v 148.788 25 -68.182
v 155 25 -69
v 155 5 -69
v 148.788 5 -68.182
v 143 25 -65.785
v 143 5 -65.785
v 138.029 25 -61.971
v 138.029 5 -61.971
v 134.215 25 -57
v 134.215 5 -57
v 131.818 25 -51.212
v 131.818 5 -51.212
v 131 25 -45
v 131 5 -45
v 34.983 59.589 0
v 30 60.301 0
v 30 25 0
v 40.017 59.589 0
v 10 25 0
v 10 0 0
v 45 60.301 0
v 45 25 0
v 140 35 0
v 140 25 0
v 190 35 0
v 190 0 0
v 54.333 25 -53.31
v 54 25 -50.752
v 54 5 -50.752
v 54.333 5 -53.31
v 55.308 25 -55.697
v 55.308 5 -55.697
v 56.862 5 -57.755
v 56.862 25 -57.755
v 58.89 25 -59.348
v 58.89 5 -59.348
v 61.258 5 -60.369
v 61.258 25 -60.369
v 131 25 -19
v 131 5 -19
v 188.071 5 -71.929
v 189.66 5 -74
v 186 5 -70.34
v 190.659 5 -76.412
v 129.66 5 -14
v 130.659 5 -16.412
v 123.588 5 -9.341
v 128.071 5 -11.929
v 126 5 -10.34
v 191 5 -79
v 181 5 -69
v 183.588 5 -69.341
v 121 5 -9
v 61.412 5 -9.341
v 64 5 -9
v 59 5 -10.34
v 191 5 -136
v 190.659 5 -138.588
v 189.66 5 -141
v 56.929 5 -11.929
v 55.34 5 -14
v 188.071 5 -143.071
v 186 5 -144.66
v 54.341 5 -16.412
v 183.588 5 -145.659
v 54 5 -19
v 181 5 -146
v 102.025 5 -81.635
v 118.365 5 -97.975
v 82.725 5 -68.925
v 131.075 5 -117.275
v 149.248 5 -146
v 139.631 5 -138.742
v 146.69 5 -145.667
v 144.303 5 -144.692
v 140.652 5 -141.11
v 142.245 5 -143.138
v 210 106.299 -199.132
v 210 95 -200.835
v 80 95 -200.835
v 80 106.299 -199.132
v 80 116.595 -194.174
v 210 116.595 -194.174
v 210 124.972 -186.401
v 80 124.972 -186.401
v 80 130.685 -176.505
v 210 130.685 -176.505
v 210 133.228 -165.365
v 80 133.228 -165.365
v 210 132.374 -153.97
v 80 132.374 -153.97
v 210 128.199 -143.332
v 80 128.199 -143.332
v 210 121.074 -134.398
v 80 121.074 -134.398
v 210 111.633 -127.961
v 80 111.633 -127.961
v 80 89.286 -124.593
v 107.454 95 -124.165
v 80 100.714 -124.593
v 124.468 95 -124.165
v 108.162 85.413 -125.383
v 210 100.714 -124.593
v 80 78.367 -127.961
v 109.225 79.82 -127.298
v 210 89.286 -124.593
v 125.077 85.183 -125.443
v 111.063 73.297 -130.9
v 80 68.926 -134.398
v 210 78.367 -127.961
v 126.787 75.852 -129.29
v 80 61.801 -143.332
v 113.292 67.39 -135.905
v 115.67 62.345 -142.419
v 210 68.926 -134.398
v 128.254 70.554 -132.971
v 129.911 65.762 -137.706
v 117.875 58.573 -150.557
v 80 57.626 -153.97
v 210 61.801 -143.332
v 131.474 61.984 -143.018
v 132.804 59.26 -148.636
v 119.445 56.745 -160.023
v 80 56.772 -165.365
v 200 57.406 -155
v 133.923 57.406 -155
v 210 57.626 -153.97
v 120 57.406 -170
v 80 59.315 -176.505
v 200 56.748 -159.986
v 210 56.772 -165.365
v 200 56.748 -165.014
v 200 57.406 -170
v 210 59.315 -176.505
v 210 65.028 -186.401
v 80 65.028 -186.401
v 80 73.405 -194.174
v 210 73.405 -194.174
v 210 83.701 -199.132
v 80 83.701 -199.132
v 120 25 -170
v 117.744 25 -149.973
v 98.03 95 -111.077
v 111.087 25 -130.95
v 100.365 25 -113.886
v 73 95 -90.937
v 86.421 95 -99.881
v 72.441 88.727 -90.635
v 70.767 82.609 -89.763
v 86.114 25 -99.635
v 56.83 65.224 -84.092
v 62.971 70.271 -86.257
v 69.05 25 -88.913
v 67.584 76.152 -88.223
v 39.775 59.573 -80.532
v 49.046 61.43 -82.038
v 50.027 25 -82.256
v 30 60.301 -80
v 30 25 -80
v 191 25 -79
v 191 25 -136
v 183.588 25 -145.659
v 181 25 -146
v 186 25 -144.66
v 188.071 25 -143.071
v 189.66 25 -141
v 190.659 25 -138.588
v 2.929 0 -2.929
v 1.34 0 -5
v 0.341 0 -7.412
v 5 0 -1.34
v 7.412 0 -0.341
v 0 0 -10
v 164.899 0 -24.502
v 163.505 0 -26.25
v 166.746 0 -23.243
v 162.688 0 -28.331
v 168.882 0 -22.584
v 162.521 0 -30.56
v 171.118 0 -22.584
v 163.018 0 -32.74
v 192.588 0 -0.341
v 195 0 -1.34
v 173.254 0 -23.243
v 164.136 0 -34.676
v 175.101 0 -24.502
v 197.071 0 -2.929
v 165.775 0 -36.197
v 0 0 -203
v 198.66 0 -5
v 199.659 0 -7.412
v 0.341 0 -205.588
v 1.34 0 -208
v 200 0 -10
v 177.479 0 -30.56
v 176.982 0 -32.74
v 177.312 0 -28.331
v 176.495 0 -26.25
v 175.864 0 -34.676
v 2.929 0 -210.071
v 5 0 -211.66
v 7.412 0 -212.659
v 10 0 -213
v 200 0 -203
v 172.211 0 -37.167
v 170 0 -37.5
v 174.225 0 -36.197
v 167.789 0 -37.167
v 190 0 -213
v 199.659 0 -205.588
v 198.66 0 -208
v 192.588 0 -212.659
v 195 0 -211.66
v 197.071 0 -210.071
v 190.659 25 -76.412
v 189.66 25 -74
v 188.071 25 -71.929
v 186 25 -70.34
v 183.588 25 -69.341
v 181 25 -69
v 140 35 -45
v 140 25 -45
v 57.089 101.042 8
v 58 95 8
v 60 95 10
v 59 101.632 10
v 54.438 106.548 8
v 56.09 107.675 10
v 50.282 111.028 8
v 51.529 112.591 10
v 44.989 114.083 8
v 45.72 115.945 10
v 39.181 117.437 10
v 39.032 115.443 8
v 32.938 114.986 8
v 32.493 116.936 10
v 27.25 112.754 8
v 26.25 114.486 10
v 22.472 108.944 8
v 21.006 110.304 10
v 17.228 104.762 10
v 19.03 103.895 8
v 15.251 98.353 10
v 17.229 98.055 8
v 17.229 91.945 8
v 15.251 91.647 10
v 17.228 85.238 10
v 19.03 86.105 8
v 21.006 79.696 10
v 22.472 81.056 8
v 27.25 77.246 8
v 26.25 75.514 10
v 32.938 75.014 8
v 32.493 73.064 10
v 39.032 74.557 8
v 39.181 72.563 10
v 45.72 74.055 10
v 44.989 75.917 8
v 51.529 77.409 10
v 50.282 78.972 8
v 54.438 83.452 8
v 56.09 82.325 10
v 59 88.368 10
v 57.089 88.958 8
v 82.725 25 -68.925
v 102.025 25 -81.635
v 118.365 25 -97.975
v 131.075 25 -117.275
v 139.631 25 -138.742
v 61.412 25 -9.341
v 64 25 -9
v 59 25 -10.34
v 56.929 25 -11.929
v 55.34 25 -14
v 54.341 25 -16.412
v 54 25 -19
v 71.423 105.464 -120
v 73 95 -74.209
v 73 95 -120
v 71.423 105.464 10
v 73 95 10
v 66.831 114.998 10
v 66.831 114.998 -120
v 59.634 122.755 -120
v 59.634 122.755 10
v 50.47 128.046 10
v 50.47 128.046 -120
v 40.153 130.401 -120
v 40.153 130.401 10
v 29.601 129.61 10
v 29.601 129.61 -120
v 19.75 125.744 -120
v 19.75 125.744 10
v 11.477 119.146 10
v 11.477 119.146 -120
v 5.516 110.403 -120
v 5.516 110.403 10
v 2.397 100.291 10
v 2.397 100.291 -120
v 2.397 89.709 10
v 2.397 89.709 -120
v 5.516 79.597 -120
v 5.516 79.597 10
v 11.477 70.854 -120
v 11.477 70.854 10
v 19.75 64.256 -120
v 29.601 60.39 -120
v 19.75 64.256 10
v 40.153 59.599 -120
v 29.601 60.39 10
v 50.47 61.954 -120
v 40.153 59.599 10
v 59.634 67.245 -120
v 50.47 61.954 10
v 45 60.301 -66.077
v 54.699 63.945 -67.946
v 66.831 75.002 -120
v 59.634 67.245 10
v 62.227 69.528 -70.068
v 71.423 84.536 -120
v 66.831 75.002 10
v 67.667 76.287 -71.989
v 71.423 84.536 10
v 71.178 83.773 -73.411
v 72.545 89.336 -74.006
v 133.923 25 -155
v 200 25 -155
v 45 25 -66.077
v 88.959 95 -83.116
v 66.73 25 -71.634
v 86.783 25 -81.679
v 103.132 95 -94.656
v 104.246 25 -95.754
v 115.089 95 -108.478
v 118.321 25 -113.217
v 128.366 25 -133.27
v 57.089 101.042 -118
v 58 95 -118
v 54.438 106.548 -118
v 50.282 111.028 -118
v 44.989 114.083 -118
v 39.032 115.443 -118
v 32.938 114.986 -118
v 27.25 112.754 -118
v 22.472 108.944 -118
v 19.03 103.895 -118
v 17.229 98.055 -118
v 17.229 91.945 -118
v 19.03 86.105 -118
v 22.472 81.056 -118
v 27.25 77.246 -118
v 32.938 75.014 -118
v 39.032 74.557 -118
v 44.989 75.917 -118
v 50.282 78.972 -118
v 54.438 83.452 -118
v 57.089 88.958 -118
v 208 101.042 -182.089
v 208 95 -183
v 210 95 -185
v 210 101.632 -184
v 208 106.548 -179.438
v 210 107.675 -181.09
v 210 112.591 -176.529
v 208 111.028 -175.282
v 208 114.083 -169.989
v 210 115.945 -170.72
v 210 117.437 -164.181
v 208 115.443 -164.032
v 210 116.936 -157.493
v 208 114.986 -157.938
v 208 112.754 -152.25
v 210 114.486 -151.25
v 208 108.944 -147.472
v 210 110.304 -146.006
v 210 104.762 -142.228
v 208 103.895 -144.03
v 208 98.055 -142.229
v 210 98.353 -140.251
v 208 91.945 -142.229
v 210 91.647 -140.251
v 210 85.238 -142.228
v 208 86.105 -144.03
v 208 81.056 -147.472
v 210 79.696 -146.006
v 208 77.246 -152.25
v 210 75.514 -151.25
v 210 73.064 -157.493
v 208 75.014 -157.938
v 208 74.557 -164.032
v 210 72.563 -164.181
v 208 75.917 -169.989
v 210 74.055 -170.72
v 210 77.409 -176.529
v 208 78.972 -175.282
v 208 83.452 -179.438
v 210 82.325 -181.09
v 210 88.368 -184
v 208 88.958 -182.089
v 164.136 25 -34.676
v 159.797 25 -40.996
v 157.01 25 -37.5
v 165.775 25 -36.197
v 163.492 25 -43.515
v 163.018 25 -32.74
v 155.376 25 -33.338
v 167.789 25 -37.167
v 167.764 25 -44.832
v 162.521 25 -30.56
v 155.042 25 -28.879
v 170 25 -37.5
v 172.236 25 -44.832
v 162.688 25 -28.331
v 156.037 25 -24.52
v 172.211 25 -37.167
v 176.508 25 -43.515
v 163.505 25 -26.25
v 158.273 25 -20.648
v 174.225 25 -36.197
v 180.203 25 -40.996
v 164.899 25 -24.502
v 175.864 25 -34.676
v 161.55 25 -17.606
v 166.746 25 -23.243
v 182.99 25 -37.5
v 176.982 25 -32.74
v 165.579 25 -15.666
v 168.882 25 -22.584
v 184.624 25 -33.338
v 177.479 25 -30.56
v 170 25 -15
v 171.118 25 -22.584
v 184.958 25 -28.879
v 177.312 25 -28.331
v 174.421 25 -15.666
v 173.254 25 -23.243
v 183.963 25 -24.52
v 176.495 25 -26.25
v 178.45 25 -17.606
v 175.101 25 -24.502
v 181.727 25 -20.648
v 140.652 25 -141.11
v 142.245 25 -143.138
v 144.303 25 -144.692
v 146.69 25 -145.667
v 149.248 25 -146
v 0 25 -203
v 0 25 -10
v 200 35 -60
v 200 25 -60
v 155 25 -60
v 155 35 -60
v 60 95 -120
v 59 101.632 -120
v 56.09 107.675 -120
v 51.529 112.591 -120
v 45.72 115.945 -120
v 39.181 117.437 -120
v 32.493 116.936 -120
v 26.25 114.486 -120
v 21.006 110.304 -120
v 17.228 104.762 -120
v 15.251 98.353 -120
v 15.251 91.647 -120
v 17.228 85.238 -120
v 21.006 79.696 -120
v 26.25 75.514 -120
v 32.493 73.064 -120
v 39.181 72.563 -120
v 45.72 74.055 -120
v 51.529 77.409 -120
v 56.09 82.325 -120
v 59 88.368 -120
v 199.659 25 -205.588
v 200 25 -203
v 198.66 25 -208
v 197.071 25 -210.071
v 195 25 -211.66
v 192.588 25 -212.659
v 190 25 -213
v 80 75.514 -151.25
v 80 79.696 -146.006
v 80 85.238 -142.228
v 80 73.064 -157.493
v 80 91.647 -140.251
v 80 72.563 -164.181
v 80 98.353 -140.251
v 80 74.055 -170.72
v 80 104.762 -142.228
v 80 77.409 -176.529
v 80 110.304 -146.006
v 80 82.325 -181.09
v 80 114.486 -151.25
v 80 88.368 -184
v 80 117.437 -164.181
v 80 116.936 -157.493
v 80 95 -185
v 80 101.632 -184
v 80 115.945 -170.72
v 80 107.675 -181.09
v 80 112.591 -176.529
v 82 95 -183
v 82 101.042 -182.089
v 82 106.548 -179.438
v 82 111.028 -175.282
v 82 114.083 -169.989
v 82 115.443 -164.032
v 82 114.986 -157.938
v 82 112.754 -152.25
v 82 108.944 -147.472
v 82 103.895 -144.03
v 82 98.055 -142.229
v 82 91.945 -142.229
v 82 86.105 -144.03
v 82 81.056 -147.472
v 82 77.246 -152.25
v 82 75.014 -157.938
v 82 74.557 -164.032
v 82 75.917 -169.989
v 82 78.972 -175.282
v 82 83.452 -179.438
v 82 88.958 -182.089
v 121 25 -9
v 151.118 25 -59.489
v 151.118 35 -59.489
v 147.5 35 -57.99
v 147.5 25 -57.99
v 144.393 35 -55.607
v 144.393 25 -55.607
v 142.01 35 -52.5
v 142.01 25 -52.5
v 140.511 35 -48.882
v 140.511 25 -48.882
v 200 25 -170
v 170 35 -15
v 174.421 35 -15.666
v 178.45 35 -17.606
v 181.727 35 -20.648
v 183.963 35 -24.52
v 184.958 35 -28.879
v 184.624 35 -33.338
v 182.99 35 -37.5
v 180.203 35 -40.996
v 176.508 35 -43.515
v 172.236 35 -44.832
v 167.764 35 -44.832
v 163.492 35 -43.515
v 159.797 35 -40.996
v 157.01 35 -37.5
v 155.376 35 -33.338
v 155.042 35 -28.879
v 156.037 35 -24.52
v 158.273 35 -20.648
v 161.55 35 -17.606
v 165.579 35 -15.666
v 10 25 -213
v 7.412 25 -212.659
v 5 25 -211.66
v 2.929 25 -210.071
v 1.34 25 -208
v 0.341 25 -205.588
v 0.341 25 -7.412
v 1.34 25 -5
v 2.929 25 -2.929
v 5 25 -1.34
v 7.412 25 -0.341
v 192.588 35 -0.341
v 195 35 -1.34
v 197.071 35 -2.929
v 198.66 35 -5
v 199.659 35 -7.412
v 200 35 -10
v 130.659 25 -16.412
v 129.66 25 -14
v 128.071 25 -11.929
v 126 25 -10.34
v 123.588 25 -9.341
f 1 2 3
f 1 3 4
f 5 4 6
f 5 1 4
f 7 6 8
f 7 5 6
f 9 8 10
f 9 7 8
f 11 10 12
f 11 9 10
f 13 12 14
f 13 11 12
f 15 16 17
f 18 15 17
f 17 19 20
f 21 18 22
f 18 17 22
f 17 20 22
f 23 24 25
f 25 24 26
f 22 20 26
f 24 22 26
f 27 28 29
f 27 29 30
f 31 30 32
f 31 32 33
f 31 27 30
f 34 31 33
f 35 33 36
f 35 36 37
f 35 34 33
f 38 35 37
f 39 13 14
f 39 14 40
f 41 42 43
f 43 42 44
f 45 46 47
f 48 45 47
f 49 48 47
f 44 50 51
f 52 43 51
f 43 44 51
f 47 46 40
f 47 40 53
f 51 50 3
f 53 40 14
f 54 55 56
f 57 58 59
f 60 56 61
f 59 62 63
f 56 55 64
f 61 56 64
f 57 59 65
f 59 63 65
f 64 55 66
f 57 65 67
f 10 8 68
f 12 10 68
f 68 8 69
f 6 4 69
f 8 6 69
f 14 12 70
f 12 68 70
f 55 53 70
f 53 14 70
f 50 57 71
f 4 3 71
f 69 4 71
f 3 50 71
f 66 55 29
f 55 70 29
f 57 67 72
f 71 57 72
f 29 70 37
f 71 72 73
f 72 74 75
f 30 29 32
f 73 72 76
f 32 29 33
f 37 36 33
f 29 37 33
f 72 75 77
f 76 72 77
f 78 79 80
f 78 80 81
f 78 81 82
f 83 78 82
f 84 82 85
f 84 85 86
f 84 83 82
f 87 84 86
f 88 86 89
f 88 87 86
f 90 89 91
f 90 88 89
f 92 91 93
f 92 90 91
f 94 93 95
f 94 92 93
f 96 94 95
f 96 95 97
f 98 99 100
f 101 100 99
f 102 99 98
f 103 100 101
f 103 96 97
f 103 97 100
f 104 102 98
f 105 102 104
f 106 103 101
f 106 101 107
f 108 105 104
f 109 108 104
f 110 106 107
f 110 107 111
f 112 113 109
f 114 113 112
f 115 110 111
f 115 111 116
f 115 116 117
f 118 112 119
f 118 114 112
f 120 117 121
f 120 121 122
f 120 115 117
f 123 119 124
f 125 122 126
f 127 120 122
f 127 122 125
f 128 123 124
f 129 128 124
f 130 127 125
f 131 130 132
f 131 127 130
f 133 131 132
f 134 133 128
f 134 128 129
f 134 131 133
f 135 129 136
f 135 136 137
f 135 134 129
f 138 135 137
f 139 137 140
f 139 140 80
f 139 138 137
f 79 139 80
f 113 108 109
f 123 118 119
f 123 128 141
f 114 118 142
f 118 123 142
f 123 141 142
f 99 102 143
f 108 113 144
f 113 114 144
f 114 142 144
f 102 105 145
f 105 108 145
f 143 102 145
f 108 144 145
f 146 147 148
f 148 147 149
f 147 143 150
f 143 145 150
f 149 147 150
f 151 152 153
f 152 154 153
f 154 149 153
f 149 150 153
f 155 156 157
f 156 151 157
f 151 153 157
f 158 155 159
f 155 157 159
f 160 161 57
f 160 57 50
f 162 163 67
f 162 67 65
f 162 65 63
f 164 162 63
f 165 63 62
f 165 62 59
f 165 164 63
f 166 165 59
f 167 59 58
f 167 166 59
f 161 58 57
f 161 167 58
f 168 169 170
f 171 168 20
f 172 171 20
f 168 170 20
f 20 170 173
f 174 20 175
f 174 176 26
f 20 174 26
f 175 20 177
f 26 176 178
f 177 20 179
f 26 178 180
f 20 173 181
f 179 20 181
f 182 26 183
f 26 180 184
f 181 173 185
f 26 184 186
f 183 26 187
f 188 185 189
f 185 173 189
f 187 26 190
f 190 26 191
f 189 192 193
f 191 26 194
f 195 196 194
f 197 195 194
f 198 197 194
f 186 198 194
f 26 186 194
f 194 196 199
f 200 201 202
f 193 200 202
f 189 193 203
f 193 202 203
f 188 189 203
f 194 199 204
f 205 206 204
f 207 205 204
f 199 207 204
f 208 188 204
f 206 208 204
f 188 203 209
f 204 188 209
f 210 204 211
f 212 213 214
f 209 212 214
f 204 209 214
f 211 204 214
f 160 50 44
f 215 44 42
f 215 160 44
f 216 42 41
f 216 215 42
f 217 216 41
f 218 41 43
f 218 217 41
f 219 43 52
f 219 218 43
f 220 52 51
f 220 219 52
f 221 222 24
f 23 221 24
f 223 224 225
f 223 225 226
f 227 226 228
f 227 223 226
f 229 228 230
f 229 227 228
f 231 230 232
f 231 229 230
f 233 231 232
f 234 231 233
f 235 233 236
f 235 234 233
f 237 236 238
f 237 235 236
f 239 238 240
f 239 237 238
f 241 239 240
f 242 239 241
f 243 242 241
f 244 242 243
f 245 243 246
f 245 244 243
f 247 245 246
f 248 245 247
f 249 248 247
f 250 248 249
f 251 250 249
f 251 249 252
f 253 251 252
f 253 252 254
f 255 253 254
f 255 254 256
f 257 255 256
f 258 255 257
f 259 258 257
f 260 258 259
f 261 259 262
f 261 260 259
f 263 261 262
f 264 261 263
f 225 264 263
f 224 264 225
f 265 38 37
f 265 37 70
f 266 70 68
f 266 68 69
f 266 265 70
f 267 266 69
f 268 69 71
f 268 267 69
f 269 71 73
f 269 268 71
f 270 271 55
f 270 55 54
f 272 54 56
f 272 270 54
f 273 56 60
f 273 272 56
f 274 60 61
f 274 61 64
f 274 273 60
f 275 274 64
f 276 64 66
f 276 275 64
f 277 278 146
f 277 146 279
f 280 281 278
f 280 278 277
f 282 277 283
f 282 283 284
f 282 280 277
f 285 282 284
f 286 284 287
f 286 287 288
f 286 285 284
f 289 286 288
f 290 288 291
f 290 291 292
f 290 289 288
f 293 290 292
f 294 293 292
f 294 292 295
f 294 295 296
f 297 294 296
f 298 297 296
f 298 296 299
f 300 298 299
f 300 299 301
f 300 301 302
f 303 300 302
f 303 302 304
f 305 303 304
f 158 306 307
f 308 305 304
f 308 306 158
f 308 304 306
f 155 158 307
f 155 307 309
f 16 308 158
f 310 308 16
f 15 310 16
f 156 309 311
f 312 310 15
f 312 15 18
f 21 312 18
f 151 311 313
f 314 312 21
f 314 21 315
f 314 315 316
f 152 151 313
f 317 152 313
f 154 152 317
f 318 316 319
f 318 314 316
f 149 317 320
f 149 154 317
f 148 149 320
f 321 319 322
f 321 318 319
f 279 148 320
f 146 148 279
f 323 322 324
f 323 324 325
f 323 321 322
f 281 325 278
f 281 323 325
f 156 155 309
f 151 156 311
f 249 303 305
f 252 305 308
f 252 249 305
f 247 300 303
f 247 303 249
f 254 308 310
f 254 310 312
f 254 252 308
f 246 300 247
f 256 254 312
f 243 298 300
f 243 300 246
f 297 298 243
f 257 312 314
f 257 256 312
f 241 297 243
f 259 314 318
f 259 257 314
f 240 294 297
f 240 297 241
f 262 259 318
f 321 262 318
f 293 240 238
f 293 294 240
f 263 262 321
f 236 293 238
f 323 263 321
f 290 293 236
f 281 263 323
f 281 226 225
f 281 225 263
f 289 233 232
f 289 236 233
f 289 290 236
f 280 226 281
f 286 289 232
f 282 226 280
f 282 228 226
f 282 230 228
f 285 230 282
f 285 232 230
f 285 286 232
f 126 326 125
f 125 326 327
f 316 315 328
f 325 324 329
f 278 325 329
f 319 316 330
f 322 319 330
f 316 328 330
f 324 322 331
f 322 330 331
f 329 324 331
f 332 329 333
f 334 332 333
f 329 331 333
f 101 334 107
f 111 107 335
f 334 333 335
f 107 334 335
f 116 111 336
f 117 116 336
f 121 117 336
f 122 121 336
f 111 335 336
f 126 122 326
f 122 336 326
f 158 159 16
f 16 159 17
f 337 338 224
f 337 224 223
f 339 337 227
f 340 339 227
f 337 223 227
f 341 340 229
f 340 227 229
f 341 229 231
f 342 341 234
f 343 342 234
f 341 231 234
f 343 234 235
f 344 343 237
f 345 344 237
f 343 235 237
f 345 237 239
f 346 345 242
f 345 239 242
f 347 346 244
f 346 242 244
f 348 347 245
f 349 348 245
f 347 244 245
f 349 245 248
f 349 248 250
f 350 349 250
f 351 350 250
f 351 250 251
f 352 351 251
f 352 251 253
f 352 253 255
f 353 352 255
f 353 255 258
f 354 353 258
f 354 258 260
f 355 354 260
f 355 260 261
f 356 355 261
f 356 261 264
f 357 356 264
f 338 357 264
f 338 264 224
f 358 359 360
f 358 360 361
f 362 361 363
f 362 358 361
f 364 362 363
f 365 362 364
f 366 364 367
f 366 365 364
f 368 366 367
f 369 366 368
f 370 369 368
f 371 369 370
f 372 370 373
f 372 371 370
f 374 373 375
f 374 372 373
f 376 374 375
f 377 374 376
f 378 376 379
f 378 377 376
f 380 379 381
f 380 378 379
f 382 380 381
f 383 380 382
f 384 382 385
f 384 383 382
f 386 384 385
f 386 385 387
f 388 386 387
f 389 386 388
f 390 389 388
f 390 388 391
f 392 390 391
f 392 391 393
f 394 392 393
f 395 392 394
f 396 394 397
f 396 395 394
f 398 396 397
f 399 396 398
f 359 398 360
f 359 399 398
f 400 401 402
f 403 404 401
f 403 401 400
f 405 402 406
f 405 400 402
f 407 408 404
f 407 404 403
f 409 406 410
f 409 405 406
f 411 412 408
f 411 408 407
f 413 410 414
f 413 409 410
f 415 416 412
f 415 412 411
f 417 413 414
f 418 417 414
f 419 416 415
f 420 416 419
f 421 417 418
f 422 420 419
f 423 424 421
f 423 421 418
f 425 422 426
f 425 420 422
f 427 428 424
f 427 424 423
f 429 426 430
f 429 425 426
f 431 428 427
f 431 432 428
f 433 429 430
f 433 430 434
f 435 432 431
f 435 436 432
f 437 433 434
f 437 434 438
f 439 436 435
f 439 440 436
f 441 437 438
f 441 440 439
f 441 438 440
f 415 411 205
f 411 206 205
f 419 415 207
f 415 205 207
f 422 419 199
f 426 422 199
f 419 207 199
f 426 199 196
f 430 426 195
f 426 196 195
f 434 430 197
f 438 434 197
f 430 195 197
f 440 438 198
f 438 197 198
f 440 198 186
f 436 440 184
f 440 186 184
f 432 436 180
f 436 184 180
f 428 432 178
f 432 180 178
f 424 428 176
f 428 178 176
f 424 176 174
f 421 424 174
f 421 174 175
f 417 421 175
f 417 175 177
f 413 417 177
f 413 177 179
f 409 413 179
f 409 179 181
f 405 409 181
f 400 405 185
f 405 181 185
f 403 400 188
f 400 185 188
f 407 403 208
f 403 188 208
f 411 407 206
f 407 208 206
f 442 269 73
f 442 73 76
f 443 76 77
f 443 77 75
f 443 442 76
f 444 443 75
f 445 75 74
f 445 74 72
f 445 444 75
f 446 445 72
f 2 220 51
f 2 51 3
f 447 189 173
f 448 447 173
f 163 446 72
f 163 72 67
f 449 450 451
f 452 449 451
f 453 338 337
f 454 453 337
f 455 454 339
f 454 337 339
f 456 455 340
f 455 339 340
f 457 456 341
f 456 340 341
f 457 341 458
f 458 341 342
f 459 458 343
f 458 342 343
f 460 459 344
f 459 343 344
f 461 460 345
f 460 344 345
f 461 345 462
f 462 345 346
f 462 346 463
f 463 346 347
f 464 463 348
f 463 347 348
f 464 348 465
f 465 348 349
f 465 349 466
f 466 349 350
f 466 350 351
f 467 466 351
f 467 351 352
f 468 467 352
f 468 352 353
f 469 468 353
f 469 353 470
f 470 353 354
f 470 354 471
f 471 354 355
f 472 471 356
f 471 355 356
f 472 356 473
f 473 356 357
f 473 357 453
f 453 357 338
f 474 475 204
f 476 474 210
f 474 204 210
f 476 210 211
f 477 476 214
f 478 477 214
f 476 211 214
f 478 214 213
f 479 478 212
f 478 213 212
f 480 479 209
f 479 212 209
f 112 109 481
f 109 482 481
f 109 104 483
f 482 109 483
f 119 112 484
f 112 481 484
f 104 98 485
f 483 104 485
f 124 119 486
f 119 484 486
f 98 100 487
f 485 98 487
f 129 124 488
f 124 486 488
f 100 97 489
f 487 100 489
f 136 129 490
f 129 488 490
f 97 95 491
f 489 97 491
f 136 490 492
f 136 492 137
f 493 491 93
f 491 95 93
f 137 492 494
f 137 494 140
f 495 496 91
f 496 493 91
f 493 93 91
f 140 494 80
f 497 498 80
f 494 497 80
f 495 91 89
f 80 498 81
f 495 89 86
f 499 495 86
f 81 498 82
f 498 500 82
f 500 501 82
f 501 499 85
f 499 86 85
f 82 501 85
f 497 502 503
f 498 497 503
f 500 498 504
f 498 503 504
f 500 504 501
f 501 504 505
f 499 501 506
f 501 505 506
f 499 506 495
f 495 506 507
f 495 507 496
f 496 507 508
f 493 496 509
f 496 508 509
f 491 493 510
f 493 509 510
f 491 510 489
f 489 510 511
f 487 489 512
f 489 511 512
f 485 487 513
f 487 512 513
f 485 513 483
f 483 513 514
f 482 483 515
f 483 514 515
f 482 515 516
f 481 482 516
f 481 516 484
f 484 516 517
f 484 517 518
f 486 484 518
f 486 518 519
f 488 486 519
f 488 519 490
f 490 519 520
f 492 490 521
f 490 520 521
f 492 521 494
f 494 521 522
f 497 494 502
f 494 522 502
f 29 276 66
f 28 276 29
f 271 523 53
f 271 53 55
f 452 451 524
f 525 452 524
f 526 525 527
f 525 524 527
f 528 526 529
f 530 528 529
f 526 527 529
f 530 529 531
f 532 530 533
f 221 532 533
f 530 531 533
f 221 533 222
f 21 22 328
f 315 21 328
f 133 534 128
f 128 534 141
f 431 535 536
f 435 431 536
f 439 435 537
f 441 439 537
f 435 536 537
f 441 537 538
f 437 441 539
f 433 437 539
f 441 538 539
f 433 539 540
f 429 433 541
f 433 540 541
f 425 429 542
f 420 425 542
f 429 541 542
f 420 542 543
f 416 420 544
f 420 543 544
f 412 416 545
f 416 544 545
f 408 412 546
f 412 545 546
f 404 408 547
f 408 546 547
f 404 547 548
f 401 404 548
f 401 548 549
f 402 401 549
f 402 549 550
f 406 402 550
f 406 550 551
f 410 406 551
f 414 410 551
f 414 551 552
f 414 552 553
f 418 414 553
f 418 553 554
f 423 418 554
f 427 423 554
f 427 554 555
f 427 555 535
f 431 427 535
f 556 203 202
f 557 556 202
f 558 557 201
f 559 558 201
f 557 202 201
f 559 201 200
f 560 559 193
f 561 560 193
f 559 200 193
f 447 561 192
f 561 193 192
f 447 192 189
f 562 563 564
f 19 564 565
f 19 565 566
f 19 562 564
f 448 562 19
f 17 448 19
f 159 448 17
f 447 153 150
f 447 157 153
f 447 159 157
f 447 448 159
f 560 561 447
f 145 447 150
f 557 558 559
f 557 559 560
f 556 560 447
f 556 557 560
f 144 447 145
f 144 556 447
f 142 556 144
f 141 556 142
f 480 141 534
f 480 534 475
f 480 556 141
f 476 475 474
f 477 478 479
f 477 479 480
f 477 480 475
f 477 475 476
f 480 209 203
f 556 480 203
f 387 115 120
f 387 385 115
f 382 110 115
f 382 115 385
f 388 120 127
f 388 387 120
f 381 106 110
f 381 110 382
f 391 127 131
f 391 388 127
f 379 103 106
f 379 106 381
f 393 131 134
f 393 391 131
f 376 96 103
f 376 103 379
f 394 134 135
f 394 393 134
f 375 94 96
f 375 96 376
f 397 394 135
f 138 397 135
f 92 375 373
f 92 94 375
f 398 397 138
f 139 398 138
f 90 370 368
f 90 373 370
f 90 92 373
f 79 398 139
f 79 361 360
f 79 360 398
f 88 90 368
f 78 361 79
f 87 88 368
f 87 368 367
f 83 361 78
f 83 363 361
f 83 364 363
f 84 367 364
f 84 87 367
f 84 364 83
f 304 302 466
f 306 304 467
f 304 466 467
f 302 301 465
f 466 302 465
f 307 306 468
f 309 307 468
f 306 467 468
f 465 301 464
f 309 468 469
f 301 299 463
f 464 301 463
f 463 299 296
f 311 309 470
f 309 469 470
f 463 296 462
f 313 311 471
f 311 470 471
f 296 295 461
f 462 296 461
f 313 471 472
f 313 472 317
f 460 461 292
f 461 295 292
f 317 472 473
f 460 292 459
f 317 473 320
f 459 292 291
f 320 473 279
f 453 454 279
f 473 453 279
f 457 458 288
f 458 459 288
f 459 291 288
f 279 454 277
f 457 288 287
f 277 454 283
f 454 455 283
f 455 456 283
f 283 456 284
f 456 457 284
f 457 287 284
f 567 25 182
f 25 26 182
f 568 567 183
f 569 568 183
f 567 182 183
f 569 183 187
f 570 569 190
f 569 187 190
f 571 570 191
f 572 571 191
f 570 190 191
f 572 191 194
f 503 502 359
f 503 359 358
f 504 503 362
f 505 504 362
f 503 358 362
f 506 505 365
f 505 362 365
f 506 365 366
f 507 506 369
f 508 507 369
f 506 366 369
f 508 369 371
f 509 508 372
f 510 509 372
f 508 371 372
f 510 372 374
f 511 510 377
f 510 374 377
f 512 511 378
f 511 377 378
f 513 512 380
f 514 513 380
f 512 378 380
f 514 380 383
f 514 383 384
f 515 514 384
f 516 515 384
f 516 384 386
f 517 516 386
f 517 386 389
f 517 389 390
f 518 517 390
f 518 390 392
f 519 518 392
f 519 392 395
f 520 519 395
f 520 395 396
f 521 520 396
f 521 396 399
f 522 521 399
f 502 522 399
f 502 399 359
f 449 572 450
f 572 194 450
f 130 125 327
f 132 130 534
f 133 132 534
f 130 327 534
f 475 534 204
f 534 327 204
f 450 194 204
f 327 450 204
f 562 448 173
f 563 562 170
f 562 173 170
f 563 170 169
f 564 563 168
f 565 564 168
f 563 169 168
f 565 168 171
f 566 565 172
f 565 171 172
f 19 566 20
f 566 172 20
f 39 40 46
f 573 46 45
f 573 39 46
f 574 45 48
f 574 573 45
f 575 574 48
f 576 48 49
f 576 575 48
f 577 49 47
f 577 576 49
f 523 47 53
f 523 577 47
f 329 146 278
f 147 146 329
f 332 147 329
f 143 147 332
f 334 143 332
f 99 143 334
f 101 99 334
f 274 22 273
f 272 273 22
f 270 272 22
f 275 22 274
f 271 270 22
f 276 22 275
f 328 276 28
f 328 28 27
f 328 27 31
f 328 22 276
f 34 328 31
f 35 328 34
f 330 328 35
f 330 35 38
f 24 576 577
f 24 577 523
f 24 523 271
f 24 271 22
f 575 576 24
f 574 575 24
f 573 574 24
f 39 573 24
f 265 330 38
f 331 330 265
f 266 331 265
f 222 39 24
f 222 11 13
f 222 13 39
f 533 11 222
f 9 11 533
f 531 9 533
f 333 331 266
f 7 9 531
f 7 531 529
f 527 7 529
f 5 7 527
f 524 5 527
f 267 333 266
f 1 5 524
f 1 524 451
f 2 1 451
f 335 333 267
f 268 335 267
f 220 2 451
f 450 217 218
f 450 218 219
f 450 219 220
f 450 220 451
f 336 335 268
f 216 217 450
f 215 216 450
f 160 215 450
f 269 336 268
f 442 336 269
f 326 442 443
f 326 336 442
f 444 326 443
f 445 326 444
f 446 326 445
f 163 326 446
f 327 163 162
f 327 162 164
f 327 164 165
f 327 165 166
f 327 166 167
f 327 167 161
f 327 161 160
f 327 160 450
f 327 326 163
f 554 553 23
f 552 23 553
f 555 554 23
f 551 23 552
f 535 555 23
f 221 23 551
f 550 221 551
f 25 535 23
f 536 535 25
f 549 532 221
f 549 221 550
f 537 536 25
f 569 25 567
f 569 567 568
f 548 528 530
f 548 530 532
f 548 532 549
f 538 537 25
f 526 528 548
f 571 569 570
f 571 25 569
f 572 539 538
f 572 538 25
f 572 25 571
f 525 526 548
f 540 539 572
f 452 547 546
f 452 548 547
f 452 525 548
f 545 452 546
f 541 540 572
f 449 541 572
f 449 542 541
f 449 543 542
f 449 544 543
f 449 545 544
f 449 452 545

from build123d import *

# Parameters (mm, degrees)
EXTRUDE_1_DEPTH              = 25
EXTRUDE_2_DEPTH              = 10
HOLE_WIZARD_M8_1_D           = 15
HOLE_WIZARD_M8_1_CBORE_D     = 30
HOLE_WIZARD_M8_1_CBORE_DEPTH = 10
CUT_EXTRUDE_1_DEPTH          = 20
SKETCH_6_R                   = 35.5
EXTRUDE_3_DEPTH              = 130
SKETCH_7_R                   = 38.335
EXTRUDE_4_DEPTH              = 130
EXTRUDE_8_DEPTH              = 70
CUT_EXTRUDE_2_REACH          = 225
SKETCH_9_R                   = 20.5
CUT_EXTRUDE_3_REACH          = 212
SKETCH_10_R                  = 20.5
CHAMFER_1_SIZE               = 2


with BuildPart() as part:
    # 스케치1 → 보스-돌출1 (new body)
    with BuildSketch(Plane(origin=(0, 0, 0), x_dir=(1, 0, 0), z_dir=(0, 1, 0))):
        with BuildLine():
            Line((10, 0), (190, 0))
            ThreePointArc((190, 0), (197.071067812, 2.928932188), (200, 10))
            Line((200, 10), (200, 203))
            ThreePointArc((200, 203), (197.071067812, 210.071067812), (190, 213))
            Line((190, 213), (10, 213))
            ThreePointArc((10, 213), (2.928932188, 210.071067812), (0, 203))
            Line((0, 203), (0, 10))
            ThreePointArc((0, 10), (2.928932188, 2.928932188), (10, 0))
        make_face()
    extrude(amount=EXTRUDE_1_DEPTH)

    # 스케치2 → 보스-돌출2 (add)
    with BuildSketch(Plane(origin=(0, 25, 0), x_dir=(1, 0, 0), z_dir=(0, 1, 0))):
        with BuildLine():
            Line((140, 0), (190, 0))
            ThreePointArc((190, 0), (197.071067812, 2.928932188), (200, 10))
            Line((200, 10), (200, 60))
            Line((200, 60), (155, 60))
            ThreePointArc((155, 60), (144.393398282, 55.606601718), (140, 45))
            Line((140, 45), (140, 0))
        make_face()
    extrude(amount=EXTRUDE_2_DEPTH)

    # M8 육각 머리 볼트용 카운터보어1 (through all)
    with Locations(Plane(origin=(170, 35, -30), x_dir=(0, 0, 1), z_dir=(0, 1, 0))):
        with Locations((0, 0)):
            CounterBoreHole(HOLE_WIZARD_M8_1_D / 2, HOLE_WIZARD_M8_1_CBORE_D / 2, HOLE_WIZARD_M8_1_CBORE_DEPTH)

    # 스케치5 → 컷-돌출1 (cut)
    with BuildSketch(Plane(origin=(0, 25, 0), x_dir=(1, 0, 0), z_dir=(0, 1, 0))):
        with BuildLine():
            Line((149.247641486, 146), (181, 146))
            ThreePointArc((181, 146), (188.071067812, 143.071067812), (191, 136))
            Line((191, 136), (191, 79))
            ThreePointArc((191, 79), (188.071067812, 71.928932188), (181, 69))
            Line((181, 69), (155, 69))
            ThreePointArc((155, 69), (138.029437252, 61.970562748), (131, 45))
            Line((131, 45), (131, 19))
            ThreePointArc((131, 19), (128.071067812, 11.928932188), (121, 9))
            Line((121, 9), (64, 9))
            ThreePointArc((64, 9), (56.928932188, 11.928932188), (54, 19))
            Line((54, 19), (54, 50.752358514))
            ThreePointArc((54, 50.752358514), (56.018165786, 56.776503481), (61.258064516, 60.369103795))
            ThreePointArc((61.258064516, 60.369103795), (110.610173055, 89.389826945), (139.630896205, 138.741935484))
            ThreePointArc((139.630896205, 138.741935484), (143.223496519, 143.981834214), (149.247641486, 146))
        make_face()
    extrude(amount=-CUT_EXTRUDE_1_DEPTH, mode=Mode.SUBTRACT)



with BuildPart() as body_2:
    # 스케치6 → 보스-돌출3 (new body)
    with BuildSketch(Plane.XY.offset(10)):
        with Locations((37.5, 95)):
            Circle(SKETCH_6_R)
    extrude(amount=-EXTRUDE_3_DEPTH)


with BuildPart() as body_3:
    # 스케치7 → 보스-돌출4 (new body)
    with BuildSketch(Plane(origin=(210, 0, 0), x_dir=(0, 0, -1), z_dir=(1, 0, 0))):
        with Locations((162.5, 95)):
            Circle(SKETCH_7_R)
    extrude(amount=-EXTRUDE_4_DEPTH)


with BuildPart() as part_1:
    add(part.part)

    add(body_2.part)  # 보스-돌출8 merges body 2

    add(body_3.part)  # 보스-돌출8 merges body 3
    # 스케치8 → 보스-돌출8 (add)
    with BuildSketch(Plane(origin=(0, 25, 0), x_dir=(1, 0, 0), z_dir=(0, 1, 0))):
        with BuildLine():
            Line((30, 0), (45, 0))
            Line((45, 0), (45, 66.076951546))
            ThreePointArc((45, 66.076951546), (104.246212025, 95.753787975), (133.923048454, 155))
            Line((133.923048454, 155), (200, 155))
            Line((200, 155), (200, 170))
            Line((200, 170), (120, 170))
            ThreePointArc((120, 170), (93.639610307, 106.360389693), (30, 80))
            Line((30, 80), (30, 0))
        make_face()
    extrude(amount=EXTRUDE_8_DEPTH)

    # 스케치9 → 컷-돌출2 (cut, up to next)
    with BuildSketch(Plane.XY.offset(10), mode=Mode.PRIVATE) as cut_extrude_2_sk1:
        with Locations((37.5, 95)):
            Circle(SKETCH_9_R)
    cut_extrude_2_tool1 = extrude(cut_extrude_2_sk1.sketch, amount=-CUT_EXTRUDE_2_REACH, mode=Mode.PRIVATE) & part_1.part
    add(cut_extrude_2_tool1.solids().sort_by_distance((37.5, 95, 10))[0], mode=Mode.SUBTRACT)

    # 스케치10 → 컷-돌출3 (cut, up to next)
    with BuildSketch(Plane(origin=(210, 0, 0), x_dir=(0, 0, -1), z_dir=(1, 0, 0)), mode=Mode.PRIVATE) as cut_extrude_3_sk1:
        with Locations((162.5, 95)):
            Circle(SKETCH_10_R)
    cut_extrude_3_tool1 = extrude(cut_extrude_3_sk1.sketch, amount=-CUT_EXTRUDE_3_REACH, mode=Mode.PRIVATE) & part_1.part
    add(cut_extrude_3_tool1.solids().sort_by_distance((210, 95, -162.5))[0], mode=Mode.SUBTRACT)

    # 모따기1
    chamfer_1_edges = [part_1.edges().sort_by_distance(p)[0] for p in [
        (17, 95, 10),
        (17, 95, -120),
        (210, 95, -142),
        (80, 95, -142),
    ]]
    chamfer(chamfer_1_edges, length=CHAMFER_1_SIZE)


solid = part_1.part
